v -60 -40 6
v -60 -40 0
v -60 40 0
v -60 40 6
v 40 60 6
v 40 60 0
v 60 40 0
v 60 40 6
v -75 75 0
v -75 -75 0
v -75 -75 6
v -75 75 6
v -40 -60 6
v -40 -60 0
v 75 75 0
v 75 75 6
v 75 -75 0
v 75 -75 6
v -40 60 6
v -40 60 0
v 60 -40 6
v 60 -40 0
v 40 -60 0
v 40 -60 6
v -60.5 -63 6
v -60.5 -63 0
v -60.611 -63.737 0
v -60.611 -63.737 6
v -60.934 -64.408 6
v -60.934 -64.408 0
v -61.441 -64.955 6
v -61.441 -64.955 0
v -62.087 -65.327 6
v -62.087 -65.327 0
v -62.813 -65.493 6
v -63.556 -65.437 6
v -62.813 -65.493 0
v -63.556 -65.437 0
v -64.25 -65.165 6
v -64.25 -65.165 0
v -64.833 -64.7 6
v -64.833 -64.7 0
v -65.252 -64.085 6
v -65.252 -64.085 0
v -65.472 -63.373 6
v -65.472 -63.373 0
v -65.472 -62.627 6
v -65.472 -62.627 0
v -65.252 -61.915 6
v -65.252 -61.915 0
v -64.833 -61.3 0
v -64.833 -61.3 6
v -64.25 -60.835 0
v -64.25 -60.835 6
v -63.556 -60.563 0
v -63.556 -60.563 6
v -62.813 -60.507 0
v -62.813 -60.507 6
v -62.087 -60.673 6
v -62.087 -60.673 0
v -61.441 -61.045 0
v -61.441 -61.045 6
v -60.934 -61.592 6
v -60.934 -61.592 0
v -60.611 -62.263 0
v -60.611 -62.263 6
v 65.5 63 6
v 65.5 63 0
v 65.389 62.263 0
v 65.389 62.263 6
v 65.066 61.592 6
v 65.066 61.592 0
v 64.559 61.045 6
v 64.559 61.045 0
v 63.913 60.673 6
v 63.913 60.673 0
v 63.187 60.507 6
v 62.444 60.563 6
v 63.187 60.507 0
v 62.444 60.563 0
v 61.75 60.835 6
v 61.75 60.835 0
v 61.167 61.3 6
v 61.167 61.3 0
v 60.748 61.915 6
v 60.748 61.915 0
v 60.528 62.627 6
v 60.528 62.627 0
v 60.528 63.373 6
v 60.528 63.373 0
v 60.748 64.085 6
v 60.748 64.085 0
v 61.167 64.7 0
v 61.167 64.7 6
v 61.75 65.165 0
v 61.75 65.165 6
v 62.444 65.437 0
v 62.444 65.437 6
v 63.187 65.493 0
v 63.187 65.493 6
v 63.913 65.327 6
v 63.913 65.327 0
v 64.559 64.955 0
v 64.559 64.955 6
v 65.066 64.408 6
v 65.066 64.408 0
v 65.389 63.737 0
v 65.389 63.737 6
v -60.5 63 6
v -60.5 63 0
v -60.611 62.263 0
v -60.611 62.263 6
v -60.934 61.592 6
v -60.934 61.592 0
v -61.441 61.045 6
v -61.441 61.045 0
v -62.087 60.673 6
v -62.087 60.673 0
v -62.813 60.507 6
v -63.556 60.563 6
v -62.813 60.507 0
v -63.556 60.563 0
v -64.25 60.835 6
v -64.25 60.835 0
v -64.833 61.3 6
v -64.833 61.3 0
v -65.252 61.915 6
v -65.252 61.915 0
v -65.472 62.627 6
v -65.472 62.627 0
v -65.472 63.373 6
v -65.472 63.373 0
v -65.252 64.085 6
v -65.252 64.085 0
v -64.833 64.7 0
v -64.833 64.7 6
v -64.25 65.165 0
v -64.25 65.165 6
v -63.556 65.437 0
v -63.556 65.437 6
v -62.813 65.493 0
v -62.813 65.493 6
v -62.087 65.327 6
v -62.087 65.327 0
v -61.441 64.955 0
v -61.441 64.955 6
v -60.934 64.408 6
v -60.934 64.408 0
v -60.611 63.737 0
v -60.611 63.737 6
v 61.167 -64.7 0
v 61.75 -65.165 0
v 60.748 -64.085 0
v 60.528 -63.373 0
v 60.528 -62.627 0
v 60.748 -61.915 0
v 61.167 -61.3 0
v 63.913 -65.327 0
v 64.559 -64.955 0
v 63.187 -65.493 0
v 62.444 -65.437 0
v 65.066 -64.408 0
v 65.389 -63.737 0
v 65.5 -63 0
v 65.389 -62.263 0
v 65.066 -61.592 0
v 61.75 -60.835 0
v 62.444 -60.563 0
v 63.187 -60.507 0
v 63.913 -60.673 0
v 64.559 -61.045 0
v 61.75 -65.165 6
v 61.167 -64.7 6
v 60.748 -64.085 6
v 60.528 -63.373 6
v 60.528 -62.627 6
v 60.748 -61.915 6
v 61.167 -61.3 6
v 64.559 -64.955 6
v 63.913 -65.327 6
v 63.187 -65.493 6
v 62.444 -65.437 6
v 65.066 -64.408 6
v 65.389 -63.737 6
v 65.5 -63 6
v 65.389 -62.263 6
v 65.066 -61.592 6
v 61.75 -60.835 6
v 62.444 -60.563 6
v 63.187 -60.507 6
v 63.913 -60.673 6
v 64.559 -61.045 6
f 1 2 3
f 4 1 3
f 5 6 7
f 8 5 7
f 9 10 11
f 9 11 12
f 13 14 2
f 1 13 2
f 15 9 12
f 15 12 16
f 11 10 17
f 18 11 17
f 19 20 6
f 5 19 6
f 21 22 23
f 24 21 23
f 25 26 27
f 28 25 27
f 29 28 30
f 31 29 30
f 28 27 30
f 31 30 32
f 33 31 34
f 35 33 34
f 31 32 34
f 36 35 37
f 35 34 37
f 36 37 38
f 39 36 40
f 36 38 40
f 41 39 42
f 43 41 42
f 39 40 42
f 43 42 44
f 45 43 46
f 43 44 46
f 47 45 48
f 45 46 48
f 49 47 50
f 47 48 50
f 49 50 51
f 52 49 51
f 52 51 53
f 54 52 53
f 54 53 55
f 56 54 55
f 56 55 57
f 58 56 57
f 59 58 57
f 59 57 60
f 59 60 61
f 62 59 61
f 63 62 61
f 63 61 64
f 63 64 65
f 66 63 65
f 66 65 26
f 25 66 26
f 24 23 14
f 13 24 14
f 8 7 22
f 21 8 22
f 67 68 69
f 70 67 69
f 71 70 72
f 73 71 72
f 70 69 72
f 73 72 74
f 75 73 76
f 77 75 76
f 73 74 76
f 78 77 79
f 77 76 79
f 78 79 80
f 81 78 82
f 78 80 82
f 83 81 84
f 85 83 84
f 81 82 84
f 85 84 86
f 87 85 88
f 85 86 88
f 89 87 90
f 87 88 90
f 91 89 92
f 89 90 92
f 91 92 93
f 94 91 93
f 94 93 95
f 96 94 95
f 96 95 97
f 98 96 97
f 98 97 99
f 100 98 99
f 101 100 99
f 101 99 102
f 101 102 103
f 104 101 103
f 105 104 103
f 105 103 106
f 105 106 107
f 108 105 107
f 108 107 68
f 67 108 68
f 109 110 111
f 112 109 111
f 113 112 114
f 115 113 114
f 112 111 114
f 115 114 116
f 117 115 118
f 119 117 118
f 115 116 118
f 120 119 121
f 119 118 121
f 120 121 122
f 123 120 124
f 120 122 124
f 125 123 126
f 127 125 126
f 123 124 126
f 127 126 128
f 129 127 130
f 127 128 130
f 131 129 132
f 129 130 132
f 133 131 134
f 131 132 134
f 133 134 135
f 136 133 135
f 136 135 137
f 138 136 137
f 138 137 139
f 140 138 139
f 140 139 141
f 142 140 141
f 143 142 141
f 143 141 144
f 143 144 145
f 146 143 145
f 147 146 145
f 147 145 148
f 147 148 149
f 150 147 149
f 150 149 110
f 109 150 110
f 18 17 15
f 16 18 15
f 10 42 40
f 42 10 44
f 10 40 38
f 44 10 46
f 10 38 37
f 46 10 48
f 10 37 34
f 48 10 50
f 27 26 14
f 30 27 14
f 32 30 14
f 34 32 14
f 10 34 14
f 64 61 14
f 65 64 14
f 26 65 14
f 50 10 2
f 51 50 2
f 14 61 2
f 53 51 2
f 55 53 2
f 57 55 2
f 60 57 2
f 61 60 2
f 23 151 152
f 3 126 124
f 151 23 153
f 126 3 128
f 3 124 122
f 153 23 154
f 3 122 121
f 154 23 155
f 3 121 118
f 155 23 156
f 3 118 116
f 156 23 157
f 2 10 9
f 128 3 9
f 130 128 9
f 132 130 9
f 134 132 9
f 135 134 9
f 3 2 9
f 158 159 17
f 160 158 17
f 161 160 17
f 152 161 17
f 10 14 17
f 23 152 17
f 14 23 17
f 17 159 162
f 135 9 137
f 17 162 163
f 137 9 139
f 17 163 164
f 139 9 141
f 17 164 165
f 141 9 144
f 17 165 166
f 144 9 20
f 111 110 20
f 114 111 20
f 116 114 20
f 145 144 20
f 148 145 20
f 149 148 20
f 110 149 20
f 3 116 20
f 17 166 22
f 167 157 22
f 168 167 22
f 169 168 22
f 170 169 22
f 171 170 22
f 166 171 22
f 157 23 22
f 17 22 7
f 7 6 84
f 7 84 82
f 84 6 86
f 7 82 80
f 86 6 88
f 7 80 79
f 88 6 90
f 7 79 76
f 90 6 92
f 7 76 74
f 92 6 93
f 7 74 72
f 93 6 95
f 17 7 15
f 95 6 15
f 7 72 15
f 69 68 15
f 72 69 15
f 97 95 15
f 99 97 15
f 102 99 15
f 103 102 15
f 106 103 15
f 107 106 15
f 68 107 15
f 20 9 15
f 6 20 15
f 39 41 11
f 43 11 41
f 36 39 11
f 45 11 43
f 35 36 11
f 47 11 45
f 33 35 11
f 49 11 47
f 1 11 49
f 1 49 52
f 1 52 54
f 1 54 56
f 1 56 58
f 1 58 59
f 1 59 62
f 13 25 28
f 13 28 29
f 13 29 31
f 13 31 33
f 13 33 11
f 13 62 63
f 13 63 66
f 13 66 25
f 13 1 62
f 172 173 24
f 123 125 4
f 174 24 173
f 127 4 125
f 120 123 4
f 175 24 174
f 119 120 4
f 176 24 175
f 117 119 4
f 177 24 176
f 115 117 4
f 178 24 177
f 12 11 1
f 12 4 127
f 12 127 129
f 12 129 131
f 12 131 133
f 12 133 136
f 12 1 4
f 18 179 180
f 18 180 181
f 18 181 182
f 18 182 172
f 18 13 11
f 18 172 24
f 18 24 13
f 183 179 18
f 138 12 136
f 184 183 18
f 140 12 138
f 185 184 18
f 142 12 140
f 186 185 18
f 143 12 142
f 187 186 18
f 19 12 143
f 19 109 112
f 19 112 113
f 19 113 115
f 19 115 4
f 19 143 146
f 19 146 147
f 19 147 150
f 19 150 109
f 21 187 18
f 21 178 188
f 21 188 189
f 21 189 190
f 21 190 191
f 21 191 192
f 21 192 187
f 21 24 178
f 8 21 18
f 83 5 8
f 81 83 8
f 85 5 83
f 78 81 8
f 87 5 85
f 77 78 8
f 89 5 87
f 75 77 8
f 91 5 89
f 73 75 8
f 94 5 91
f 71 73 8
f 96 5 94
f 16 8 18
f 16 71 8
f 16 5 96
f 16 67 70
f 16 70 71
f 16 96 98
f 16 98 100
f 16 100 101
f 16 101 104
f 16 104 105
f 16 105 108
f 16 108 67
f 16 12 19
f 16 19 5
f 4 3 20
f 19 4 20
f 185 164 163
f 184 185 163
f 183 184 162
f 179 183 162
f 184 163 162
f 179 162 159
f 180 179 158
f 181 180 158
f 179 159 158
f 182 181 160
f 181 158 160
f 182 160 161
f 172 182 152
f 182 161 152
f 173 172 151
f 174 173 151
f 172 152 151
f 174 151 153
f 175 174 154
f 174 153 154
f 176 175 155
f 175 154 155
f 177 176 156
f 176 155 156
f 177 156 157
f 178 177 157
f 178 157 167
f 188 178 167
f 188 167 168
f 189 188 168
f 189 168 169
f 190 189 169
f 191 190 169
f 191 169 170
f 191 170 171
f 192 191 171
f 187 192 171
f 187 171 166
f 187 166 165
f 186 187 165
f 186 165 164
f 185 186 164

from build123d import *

# Parameters (mm, degrees)
SKETCH002_W          = 150
SKETCH002_H          = 150
PAD002_DEPTH         = 6
POCKET_DEPTH         = 0.001
POCKET_DEPTH_BACK    = 6.001
SKETCH004_R          = 2.5
POCKET001_DEPTH      = 6.001
POCKET001_DEPTH_BACK = 0.001


with BuildPart() as part:
    # Sketch002 → Pad002 (new body)
    with BuildSketch(Plane.XY):
        Rectangle(SKETCH002_W, SKETCH002_H)
    extrude(amount=PAD002_DEPTH)

    # Sketch003 → Pocket (cut, two sides)
    with BuildSketch(Plane.XY) as pocket_sk:
        Polygon((-60, 40), (-40, 60), (40, 60), (60, 40), (60, -40), (40, -60), (-40, -60), (-60, -40), align=None)
    extrude(amount=-POCKET_DEPTH, mode=Mode.SUBTRACT)
    extrude(pocket_sk.sketch, amount=POCKET_DEPTH_BACK, mode=Mode.SUBTRACT)

    # Sketch004 (on Face5 of Pad002) → Pocket001 (cut, two sides)
    with BuildSketch(Plane(origin=(0, 0, 0), x_dir=(1, 0, 0), z_dir=(0, 0, -1))) as pocket001_sk:
        with Locations((-63, 63)):
            Circle(SKETCH004_R)
        with Locations((63, 63)):
            Circle(SKETCH004_R)
        with Locations((63, -63)):
            Circle(SKETCH004_R)
        with Locations((-63, -63)):
            Circle(SKETCH004_R)
    extrude(amount=-POCKET001_DEPTH, mode=Mode.SUBTRACT)
    extrude(pocket001_sk.sketch, amount=POCKET001_DEPTH_BACK, mode=Mode.SUBTRACT)


solid = part.part
